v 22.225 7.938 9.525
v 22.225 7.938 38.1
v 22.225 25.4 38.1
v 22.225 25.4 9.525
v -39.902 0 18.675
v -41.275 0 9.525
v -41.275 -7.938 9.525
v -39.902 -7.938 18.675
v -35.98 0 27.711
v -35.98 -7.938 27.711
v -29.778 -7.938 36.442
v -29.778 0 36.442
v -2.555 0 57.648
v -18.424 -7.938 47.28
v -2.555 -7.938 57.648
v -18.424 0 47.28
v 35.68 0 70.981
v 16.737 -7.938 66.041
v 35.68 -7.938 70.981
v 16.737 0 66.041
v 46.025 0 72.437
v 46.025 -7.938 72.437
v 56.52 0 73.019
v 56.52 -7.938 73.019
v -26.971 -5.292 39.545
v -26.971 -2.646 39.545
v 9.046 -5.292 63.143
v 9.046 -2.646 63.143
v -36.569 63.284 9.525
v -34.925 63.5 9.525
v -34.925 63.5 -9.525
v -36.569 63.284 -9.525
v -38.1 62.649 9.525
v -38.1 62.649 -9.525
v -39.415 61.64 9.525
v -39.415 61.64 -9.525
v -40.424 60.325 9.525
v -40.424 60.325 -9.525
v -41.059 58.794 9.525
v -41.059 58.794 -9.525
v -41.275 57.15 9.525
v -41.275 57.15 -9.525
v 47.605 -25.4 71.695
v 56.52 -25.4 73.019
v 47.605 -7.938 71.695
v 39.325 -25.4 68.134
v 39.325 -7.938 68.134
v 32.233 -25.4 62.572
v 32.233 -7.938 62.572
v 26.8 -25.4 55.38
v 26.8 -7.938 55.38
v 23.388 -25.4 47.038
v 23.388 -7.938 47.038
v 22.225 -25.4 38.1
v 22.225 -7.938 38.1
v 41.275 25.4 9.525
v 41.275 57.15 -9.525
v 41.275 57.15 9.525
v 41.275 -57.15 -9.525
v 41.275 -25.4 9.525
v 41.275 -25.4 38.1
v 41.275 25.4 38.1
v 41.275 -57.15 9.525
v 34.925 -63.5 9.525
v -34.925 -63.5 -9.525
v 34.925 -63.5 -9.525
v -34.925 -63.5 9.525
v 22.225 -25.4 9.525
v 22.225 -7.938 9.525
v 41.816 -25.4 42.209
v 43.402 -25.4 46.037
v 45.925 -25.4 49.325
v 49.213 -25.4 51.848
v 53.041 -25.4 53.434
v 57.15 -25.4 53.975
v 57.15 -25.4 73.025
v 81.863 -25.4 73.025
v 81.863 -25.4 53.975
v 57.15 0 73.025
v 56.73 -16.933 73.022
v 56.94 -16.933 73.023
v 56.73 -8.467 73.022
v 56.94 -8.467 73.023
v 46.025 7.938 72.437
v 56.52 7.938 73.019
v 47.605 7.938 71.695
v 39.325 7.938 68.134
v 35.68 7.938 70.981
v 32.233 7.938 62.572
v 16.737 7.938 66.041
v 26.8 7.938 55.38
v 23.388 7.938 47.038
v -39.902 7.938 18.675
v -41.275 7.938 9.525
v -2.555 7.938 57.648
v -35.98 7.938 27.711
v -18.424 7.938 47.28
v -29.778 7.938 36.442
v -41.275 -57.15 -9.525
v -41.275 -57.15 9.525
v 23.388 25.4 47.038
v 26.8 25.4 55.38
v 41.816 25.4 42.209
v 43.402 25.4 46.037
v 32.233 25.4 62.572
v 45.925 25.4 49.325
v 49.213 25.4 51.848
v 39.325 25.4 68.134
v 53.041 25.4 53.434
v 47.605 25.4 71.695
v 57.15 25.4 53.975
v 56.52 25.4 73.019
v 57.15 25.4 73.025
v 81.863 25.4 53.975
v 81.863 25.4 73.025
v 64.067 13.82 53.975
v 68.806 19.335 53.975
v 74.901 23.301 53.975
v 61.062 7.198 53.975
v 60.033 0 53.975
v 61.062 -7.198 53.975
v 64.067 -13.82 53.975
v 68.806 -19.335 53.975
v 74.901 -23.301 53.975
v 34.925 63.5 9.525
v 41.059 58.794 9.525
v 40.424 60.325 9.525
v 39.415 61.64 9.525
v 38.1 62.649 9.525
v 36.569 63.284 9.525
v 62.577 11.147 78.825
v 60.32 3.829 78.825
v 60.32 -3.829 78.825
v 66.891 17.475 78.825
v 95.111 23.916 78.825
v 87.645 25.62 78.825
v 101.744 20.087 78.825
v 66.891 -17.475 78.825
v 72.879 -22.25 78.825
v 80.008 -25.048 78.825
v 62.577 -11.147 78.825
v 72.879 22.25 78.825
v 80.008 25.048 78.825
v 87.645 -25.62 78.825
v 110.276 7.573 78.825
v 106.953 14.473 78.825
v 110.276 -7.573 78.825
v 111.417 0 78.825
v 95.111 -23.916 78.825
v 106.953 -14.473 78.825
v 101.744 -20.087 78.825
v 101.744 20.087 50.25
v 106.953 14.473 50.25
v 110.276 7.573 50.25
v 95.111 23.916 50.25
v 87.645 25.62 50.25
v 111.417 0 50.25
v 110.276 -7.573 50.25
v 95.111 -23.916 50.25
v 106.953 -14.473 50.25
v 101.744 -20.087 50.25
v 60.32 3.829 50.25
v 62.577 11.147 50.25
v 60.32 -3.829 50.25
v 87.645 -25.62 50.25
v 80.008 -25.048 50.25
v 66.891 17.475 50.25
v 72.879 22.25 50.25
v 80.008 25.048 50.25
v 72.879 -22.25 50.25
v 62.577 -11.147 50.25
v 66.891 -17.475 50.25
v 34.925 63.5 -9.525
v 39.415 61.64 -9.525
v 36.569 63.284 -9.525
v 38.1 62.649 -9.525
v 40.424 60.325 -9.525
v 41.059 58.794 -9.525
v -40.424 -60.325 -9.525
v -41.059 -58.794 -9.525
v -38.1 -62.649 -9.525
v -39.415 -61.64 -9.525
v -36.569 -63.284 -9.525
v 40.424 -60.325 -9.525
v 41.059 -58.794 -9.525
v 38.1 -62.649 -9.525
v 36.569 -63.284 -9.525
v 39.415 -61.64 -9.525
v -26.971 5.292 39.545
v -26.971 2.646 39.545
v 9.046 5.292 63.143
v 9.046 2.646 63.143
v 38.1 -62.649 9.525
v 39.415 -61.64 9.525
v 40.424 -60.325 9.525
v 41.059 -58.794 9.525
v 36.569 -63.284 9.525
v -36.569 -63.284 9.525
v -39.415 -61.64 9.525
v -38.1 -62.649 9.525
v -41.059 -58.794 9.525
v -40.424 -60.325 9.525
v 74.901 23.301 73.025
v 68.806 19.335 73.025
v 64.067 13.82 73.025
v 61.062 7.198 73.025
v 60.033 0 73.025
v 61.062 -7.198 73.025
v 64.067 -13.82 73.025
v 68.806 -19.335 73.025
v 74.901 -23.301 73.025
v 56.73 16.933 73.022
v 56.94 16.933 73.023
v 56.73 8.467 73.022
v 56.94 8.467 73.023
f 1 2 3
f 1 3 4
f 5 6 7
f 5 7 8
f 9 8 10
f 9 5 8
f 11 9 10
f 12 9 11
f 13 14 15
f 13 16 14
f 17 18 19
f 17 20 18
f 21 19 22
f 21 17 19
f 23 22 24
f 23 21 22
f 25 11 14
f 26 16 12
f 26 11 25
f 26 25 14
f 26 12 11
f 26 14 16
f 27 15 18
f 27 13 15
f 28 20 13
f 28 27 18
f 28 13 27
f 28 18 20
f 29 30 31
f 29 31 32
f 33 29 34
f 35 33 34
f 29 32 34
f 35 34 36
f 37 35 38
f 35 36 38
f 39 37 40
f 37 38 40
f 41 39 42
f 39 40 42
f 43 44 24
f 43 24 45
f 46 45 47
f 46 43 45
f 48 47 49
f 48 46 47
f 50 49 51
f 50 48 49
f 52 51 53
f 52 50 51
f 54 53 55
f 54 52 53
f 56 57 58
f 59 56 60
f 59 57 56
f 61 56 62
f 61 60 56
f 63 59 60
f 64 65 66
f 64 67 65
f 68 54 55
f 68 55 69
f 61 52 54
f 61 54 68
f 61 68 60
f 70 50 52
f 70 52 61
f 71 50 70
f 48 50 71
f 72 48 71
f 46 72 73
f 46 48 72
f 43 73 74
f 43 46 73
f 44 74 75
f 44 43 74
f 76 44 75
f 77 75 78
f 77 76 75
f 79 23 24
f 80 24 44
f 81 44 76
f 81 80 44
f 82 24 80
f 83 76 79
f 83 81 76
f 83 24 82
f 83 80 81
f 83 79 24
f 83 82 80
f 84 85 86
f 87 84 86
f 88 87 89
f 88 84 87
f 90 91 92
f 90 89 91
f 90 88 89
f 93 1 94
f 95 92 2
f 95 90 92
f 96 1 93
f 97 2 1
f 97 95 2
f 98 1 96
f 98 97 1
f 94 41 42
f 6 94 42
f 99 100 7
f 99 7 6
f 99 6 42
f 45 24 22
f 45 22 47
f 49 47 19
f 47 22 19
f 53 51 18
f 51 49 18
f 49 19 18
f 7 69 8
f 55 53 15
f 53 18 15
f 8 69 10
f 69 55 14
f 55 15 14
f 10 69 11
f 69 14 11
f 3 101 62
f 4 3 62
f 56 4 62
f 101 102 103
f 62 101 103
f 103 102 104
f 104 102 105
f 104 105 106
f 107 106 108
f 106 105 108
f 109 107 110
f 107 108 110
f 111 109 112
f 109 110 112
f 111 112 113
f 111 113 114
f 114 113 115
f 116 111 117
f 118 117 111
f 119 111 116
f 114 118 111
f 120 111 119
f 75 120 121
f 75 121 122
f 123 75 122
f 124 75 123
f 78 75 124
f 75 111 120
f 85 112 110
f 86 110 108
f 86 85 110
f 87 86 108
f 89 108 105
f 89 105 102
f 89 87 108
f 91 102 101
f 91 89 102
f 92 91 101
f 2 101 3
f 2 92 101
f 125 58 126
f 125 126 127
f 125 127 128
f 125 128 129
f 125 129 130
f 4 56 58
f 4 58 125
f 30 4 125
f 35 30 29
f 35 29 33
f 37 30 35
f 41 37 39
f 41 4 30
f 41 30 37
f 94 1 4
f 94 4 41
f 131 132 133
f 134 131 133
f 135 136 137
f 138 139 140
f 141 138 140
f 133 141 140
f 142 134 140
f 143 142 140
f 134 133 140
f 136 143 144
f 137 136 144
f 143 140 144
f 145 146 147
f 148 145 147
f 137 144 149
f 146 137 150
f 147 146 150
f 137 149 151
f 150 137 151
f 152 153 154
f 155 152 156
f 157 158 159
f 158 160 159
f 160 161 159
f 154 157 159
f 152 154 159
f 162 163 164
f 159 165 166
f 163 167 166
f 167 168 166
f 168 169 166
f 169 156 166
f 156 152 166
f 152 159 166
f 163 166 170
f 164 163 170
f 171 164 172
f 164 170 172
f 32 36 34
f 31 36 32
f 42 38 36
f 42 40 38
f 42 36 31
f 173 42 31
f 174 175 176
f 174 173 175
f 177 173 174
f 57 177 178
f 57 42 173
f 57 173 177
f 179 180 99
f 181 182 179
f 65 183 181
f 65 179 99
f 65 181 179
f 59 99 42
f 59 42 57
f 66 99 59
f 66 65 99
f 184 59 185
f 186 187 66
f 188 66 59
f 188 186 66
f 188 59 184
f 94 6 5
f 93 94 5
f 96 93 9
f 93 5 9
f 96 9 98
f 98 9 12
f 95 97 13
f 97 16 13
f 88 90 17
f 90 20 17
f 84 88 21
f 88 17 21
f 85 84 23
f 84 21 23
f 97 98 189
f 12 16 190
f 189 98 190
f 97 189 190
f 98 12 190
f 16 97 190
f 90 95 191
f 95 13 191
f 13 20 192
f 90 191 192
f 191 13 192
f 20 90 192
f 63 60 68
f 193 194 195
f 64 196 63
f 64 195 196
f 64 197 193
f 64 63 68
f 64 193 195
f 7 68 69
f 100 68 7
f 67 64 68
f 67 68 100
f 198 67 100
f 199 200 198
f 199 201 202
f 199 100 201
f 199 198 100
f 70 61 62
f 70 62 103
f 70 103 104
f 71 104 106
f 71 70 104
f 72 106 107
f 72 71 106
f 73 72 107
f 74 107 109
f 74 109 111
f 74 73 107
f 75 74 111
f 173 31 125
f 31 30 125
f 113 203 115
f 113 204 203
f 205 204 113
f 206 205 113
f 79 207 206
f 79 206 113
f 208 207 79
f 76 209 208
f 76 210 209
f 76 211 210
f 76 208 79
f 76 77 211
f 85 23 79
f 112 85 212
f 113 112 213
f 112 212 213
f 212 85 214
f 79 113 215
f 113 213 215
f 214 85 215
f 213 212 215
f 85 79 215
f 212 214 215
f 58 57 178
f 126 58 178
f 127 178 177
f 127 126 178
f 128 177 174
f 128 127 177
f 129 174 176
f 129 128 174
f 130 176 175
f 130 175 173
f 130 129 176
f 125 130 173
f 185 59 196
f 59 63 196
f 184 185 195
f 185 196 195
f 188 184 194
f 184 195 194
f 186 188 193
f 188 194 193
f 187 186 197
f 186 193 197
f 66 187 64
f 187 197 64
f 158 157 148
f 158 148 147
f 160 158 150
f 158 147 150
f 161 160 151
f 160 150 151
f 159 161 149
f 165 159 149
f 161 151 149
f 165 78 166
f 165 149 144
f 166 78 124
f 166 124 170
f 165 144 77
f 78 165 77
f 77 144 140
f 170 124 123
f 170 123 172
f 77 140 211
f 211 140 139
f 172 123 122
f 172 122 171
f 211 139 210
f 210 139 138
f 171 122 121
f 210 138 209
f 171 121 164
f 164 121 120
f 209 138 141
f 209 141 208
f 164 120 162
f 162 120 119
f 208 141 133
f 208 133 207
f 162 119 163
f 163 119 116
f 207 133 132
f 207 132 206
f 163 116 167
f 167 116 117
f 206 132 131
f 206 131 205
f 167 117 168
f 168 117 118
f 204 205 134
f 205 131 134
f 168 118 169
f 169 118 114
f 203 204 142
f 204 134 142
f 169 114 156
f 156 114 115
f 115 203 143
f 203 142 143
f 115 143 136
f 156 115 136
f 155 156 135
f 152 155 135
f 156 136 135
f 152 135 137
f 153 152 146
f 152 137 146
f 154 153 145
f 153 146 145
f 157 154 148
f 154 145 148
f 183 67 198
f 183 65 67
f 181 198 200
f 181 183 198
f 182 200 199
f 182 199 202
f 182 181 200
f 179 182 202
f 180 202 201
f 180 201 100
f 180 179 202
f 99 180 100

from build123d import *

# Parameters (mm, degrees)
F1_DEPTH = 63.5
F2_DEPTH = 25.4
F3_DEPTH = 7.9375
F0_W     = 25.108041
F0_H     = 19.05
F4_DEPTH = 25.4
F6_R     = 6.35


with BuildPart() as f1:
    # F0 (on Front) → F1 (new body, symmetric)
    with BuildSketch(Plane.XZ):
        Polygon((-41.275, -9.525), (41.275, -9.525), (41.275, 9.525), (22.225, 9.525), (-41.275, 9.525), align=None)
    extrude(amount=F1_DEPTH, both=True)

    # F0 (on Front) → F2 (join, symmetric)
    with BuildSketch(Plane.XZ):
        with BuildLine():
            Line((22.225, 9.525), (41.275, 9.525))
            Line((41.275, 9.525), (41.275, 38.1))
            ThreePointArc((41.275, 38.1), (45.92468, 49.32532), (57.15, 53.975))
            Line((57.15, 53.975), (60.616959, 53.975))
            Line((60.616959, 53.975), (60.616959, 73.025))
            Line((60.616959, 73.025), (57.15, 73.025))
            add(Edge.make_bspline(
                [(56.520232, 73.019322), (56.730123, 73.021776), (56.940047, 73.023669), (57.15, 73.025)],
                knots=[116.639514, 116.639514, 116.639514, 116.639514, 117.131254, 117.131254, 117.131254, 117.131254], degree=3))
            ThreePointArc((56.520232, 73.019322), (32.232634, 62.572035), (22.225, 38.1))
            Line((22.225, 38.1), (22.225, 9.525))
        make_face()
    extrude(amount=F2_DEPTH, both=True)

    # F0 (on Front) → F3 (join, symmetric)
    with BuildSketch(Plane.XZ):
        with BuildLine():
            add(Edge.make_bspline(
                [(-41.275, 9.525), (-41.24459, 40.322047), (6.734345, 72.437214), (56.520232, 73.019322)],
                knots=[0, 0, 0, 0, 116.639514, 116.639514, 116.639514, 116.639514], degree=3))
            Line((-41.275, 9.525), (22.225, 9.525))
            Line((22.225, 9.525), (22.225, 38.1))
            ThreePointArc((22.225, 38.1), (32.232634, 62.572035), (56.520232, 73.019322))
        make_face()
    extrude(amount=F3_DEPTH, both=True)

    # F0 (on Front) → F4 (join, symmetric)
    with BuildSketch(Plane.XZ):
        with Locations((73.170979, 63.5)):
            Rectangle(F0_W, F0_H)
    extrude(amount=F4_DEPTH, both=True)

    # F0 (on Front) → F5 (revolve)
    with BuildSketch(Plane.XZ):
        Polygon((85.725, 73.025), (85.725, 53.975), (85.725, 50.250445), (111.416959, 50.250445), (111.416959, 78.825445), (85.725, 78.825445), align=None)
    revolve(axis=Axis((85.725, 0, 64.537945), (0, 0, -1)))

    # F6
    f6_edges = [f1.edges().sort_by_distance(p)[0] for p in [
        (-41.275, -63.5, 0),
        (41.275, -63.5, 0),
        (41.275, 63.5, 0),
        (-41.275, 63.5, 0),
    ]]
    fillet(f6_edges, radius=F6_R)


solid = f1.part
